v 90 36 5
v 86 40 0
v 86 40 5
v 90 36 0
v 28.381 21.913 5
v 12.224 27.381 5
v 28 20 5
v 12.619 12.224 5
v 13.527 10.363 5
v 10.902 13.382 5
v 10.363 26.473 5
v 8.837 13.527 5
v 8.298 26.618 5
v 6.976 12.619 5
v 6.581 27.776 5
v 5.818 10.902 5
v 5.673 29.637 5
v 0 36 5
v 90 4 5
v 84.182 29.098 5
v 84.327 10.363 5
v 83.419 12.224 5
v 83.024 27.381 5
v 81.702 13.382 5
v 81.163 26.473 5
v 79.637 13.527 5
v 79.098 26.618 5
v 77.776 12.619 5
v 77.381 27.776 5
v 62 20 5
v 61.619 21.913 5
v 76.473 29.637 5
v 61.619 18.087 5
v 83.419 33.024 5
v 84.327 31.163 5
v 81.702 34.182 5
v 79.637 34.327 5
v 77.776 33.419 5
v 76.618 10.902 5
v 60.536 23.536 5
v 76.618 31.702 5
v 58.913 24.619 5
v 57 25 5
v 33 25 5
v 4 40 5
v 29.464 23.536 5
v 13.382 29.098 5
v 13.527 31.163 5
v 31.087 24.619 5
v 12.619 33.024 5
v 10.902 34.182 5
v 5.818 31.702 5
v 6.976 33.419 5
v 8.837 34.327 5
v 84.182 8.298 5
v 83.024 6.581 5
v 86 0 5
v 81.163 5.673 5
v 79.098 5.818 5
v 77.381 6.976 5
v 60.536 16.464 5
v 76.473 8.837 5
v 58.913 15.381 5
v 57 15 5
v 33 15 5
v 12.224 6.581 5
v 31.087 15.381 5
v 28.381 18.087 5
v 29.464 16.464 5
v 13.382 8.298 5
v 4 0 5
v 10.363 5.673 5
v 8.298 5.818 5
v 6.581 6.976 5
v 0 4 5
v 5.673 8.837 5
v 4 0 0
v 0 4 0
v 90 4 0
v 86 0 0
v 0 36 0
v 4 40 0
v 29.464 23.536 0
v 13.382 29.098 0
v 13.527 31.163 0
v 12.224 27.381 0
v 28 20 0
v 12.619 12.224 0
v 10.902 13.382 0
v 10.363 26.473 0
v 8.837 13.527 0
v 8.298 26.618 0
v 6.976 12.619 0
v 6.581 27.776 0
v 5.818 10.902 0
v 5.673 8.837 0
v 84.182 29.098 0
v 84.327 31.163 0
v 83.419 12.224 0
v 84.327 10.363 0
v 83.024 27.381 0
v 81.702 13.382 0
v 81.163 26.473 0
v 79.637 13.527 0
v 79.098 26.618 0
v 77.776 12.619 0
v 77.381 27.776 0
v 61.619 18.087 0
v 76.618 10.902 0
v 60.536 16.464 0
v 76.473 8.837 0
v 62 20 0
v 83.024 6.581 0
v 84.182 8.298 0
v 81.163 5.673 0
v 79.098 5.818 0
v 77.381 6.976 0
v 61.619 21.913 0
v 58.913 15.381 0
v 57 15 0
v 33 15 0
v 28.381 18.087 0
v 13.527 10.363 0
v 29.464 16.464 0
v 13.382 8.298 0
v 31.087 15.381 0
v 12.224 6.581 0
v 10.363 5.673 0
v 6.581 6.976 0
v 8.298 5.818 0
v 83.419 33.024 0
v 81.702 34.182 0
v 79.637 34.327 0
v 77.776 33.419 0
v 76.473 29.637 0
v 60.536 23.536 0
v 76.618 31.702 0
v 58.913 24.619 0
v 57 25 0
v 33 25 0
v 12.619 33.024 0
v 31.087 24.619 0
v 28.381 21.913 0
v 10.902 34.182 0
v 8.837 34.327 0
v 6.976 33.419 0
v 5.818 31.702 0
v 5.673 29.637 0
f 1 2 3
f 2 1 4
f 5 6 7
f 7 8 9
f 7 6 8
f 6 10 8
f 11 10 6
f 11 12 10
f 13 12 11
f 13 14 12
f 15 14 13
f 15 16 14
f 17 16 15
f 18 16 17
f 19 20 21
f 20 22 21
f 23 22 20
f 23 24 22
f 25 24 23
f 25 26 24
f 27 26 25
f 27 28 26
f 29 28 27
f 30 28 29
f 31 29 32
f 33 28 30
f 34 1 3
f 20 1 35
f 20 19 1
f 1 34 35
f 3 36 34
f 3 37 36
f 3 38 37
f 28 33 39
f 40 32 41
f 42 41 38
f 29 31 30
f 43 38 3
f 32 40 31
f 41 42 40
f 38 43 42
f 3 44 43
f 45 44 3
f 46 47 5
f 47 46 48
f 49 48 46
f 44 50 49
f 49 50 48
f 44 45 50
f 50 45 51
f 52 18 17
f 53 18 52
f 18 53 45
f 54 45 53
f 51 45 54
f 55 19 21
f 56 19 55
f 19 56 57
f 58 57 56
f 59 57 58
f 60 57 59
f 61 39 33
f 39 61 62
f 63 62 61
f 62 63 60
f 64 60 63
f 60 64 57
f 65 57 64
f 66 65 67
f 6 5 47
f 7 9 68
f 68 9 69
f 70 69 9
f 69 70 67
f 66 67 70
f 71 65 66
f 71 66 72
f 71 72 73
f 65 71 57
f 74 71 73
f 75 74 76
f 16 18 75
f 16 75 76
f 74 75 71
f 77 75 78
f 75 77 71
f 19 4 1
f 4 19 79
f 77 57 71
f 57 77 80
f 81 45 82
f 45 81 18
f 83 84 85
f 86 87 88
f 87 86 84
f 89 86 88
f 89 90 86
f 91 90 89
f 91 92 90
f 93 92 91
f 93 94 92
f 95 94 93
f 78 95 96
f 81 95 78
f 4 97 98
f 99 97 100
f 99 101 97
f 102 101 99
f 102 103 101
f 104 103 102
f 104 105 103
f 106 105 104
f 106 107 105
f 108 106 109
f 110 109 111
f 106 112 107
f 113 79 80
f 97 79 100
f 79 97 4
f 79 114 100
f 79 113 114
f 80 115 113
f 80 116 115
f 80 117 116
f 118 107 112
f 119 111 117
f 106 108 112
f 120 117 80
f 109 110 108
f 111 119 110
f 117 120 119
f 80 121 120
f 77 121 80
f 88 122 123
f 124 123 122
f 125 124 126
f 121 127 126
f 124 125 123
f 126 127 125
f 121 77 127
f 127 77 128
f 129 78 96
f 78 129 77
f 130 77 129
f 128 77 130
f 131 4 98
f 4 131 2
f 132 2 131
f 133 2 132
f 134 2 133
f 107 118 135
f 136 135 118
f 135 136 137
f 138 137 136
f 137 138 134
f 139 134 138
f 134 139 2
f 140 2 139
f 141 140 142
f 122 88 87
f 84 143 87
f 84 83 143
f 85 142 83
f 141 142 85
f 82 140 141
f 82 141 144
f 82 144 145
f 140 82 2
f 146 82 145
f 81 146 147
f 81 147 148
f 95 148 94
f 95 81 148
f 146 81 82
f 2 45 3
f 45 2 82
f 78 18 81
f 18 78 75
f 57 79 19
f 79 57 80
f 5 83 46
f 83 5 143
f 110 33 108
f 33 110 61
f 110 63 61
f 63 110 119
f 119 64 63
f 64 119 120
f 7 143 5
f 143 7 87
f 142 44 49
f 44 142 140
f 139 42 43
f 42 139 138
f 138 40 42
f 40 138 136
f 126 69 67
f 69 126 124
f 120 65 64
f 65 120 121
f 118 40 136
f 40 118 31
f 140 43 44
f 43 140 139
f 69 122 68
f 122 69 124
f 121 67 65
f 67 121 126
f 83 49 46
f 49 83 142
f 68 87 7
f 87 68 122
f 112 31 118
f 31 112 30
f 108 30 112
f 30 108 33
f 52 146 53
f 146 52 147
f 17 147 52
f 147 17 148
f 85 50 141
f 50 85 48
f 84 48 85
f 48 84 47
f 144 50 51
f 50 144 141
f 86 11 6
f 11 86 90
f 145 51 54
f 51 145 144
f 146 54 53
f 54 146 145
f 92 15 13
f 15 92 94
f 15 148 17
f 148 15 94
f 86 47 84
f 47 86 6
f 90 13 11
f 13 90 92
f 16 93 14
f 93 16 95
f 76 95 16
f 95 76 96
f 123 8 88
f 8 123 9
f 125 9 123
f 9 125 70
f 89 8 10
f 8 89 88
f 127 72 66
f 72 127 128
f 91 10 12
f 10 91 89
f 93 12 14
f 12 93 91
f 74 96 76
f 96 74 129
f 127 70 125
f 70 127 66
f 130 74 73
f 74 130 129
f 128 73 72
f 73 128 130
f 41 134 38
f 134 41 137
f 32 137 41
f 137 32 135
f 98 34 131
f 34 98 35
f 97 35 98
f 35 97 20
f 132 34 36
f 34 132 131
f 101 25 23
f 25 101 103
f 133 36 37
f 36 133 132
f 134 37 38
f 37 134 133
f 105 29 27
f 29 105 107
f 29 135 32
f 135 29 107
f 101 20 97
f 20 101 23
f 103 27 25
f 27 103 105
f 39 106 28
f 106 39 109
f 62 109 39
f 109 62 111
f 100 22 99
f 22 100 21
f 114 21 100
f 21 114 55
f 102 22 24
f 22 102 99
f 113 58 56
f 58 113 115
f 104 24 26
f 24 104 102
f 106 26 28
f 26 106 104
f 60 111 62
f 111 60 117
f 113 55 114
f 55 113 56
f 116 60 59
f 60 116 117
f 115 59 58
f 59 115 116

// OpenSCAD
$fn = 32;

// ----------------------------------------------------------------------
// Bracket plate: slot plate 90 x 40
// ----------------------------------------------------------------------

// --- parameters (mm) ---
hole_r = 4;               // bolt hole radius
plate_t = 5;              // plate thickness, Z (extrusion height)
plate_l = 90;             // plate length
plate_w = 40;             // plate width
slot_l = 24;              // slot straight length
slot_r = 5;               // slot end radius

slot_len = slot_l + 2 * slot_r;
slot_w = 2 * slot_r;
hole_d2 = 2 * hole_r;

profile = [[4, 0], [86, 0], [90, 4], [90, 36], [86, 40], [4, 40], [0, 36], [0, 4]];  // primary outline, 8 points, counter clockwise
void_1 = [[57, 15], [58.913, 15.381], [60.536, 16.464], [61.619, 18.087], [62, 20], [61.619, 21.913], [60.536, 23.536], [58.913, 24.619], [57, 25], [33, 25], [31.087, 24.619], [29.464, 23.536], [28.381, 21.913], [28, 20], [28.381, 18.087], [29.464, 16.464], [31.087, 15.381], [33, 15]];  // grip slot, 18 points
void_2 = [[13.527, 31.163], [12.619, 33.024], [10.902, 34.182], [8.837, 34.327], [6.976, 33.419], [5.818, 31.702], [5.673, 29.637], [6.581, 27.776], [8.298, 26.618], [10.363, 26.473], [12.224, 27.381], [13.382, 29.098]];  // corner hole, 12 points
void_3 = [[13.527, 10.363], [12.619, 12.224], [10.902, 13.382], [8.837, 13.527], [6.976, 12.619], [5.818, 10.902], [5.673, 8.837], [6.581, 6.976], [8.298, 5.818], [10.363, 5.673], [12.224, 6.581], [13.382, 8.298]];  // corner hole, 12 points
void_4 = [[84.327, 31.163], [83.419, 33.024], [81.702, 34.182], [79.637, 34.327], [77.776, 33.419], [76.618, 31.702], [76.473, 29.637], [77.381, 27.776], [79.098, 26.618], [81.163, 26.473], [83.024, 27.381], [84.182, 29.098]];  // corner hole, 12 points
void_5 = [[84.327, 10.363], [83.419, 12.224], [81.702, 13.382], [79.637, 13.527], [77.776, 12.619], [76.618, 10.902], [76.473, 8.837], [77.381, 6.976], [79.098, 5.818], [81.163, 5.673], [83.024, 6.581], [84.182, 8.298]];  // corner hole, 12 points

// --- the one profile operation ---
difference() {
  linear_extrude(height = plate_t) polygon(points = profile);
  translate([0, 0, -1])
    linear_extrude(height = plate_t + 2) polygon(points = void_1);
  translate([0, 0, -1])
    linear_extrude(height = plate_t + 2) polygon(points = void_2);
  translate([0, 0, -1])
    linear_extrude(height = plate_t + 2) polygon(points = void_3);
  translate([0, 0, -1])
    linear_extrude(height = plate_t + 2) polygon(points = void_4);
  translate([0, 0, -1])
    linear_extrude(height = plate_t + 2) polygon(points = void_5);
}
